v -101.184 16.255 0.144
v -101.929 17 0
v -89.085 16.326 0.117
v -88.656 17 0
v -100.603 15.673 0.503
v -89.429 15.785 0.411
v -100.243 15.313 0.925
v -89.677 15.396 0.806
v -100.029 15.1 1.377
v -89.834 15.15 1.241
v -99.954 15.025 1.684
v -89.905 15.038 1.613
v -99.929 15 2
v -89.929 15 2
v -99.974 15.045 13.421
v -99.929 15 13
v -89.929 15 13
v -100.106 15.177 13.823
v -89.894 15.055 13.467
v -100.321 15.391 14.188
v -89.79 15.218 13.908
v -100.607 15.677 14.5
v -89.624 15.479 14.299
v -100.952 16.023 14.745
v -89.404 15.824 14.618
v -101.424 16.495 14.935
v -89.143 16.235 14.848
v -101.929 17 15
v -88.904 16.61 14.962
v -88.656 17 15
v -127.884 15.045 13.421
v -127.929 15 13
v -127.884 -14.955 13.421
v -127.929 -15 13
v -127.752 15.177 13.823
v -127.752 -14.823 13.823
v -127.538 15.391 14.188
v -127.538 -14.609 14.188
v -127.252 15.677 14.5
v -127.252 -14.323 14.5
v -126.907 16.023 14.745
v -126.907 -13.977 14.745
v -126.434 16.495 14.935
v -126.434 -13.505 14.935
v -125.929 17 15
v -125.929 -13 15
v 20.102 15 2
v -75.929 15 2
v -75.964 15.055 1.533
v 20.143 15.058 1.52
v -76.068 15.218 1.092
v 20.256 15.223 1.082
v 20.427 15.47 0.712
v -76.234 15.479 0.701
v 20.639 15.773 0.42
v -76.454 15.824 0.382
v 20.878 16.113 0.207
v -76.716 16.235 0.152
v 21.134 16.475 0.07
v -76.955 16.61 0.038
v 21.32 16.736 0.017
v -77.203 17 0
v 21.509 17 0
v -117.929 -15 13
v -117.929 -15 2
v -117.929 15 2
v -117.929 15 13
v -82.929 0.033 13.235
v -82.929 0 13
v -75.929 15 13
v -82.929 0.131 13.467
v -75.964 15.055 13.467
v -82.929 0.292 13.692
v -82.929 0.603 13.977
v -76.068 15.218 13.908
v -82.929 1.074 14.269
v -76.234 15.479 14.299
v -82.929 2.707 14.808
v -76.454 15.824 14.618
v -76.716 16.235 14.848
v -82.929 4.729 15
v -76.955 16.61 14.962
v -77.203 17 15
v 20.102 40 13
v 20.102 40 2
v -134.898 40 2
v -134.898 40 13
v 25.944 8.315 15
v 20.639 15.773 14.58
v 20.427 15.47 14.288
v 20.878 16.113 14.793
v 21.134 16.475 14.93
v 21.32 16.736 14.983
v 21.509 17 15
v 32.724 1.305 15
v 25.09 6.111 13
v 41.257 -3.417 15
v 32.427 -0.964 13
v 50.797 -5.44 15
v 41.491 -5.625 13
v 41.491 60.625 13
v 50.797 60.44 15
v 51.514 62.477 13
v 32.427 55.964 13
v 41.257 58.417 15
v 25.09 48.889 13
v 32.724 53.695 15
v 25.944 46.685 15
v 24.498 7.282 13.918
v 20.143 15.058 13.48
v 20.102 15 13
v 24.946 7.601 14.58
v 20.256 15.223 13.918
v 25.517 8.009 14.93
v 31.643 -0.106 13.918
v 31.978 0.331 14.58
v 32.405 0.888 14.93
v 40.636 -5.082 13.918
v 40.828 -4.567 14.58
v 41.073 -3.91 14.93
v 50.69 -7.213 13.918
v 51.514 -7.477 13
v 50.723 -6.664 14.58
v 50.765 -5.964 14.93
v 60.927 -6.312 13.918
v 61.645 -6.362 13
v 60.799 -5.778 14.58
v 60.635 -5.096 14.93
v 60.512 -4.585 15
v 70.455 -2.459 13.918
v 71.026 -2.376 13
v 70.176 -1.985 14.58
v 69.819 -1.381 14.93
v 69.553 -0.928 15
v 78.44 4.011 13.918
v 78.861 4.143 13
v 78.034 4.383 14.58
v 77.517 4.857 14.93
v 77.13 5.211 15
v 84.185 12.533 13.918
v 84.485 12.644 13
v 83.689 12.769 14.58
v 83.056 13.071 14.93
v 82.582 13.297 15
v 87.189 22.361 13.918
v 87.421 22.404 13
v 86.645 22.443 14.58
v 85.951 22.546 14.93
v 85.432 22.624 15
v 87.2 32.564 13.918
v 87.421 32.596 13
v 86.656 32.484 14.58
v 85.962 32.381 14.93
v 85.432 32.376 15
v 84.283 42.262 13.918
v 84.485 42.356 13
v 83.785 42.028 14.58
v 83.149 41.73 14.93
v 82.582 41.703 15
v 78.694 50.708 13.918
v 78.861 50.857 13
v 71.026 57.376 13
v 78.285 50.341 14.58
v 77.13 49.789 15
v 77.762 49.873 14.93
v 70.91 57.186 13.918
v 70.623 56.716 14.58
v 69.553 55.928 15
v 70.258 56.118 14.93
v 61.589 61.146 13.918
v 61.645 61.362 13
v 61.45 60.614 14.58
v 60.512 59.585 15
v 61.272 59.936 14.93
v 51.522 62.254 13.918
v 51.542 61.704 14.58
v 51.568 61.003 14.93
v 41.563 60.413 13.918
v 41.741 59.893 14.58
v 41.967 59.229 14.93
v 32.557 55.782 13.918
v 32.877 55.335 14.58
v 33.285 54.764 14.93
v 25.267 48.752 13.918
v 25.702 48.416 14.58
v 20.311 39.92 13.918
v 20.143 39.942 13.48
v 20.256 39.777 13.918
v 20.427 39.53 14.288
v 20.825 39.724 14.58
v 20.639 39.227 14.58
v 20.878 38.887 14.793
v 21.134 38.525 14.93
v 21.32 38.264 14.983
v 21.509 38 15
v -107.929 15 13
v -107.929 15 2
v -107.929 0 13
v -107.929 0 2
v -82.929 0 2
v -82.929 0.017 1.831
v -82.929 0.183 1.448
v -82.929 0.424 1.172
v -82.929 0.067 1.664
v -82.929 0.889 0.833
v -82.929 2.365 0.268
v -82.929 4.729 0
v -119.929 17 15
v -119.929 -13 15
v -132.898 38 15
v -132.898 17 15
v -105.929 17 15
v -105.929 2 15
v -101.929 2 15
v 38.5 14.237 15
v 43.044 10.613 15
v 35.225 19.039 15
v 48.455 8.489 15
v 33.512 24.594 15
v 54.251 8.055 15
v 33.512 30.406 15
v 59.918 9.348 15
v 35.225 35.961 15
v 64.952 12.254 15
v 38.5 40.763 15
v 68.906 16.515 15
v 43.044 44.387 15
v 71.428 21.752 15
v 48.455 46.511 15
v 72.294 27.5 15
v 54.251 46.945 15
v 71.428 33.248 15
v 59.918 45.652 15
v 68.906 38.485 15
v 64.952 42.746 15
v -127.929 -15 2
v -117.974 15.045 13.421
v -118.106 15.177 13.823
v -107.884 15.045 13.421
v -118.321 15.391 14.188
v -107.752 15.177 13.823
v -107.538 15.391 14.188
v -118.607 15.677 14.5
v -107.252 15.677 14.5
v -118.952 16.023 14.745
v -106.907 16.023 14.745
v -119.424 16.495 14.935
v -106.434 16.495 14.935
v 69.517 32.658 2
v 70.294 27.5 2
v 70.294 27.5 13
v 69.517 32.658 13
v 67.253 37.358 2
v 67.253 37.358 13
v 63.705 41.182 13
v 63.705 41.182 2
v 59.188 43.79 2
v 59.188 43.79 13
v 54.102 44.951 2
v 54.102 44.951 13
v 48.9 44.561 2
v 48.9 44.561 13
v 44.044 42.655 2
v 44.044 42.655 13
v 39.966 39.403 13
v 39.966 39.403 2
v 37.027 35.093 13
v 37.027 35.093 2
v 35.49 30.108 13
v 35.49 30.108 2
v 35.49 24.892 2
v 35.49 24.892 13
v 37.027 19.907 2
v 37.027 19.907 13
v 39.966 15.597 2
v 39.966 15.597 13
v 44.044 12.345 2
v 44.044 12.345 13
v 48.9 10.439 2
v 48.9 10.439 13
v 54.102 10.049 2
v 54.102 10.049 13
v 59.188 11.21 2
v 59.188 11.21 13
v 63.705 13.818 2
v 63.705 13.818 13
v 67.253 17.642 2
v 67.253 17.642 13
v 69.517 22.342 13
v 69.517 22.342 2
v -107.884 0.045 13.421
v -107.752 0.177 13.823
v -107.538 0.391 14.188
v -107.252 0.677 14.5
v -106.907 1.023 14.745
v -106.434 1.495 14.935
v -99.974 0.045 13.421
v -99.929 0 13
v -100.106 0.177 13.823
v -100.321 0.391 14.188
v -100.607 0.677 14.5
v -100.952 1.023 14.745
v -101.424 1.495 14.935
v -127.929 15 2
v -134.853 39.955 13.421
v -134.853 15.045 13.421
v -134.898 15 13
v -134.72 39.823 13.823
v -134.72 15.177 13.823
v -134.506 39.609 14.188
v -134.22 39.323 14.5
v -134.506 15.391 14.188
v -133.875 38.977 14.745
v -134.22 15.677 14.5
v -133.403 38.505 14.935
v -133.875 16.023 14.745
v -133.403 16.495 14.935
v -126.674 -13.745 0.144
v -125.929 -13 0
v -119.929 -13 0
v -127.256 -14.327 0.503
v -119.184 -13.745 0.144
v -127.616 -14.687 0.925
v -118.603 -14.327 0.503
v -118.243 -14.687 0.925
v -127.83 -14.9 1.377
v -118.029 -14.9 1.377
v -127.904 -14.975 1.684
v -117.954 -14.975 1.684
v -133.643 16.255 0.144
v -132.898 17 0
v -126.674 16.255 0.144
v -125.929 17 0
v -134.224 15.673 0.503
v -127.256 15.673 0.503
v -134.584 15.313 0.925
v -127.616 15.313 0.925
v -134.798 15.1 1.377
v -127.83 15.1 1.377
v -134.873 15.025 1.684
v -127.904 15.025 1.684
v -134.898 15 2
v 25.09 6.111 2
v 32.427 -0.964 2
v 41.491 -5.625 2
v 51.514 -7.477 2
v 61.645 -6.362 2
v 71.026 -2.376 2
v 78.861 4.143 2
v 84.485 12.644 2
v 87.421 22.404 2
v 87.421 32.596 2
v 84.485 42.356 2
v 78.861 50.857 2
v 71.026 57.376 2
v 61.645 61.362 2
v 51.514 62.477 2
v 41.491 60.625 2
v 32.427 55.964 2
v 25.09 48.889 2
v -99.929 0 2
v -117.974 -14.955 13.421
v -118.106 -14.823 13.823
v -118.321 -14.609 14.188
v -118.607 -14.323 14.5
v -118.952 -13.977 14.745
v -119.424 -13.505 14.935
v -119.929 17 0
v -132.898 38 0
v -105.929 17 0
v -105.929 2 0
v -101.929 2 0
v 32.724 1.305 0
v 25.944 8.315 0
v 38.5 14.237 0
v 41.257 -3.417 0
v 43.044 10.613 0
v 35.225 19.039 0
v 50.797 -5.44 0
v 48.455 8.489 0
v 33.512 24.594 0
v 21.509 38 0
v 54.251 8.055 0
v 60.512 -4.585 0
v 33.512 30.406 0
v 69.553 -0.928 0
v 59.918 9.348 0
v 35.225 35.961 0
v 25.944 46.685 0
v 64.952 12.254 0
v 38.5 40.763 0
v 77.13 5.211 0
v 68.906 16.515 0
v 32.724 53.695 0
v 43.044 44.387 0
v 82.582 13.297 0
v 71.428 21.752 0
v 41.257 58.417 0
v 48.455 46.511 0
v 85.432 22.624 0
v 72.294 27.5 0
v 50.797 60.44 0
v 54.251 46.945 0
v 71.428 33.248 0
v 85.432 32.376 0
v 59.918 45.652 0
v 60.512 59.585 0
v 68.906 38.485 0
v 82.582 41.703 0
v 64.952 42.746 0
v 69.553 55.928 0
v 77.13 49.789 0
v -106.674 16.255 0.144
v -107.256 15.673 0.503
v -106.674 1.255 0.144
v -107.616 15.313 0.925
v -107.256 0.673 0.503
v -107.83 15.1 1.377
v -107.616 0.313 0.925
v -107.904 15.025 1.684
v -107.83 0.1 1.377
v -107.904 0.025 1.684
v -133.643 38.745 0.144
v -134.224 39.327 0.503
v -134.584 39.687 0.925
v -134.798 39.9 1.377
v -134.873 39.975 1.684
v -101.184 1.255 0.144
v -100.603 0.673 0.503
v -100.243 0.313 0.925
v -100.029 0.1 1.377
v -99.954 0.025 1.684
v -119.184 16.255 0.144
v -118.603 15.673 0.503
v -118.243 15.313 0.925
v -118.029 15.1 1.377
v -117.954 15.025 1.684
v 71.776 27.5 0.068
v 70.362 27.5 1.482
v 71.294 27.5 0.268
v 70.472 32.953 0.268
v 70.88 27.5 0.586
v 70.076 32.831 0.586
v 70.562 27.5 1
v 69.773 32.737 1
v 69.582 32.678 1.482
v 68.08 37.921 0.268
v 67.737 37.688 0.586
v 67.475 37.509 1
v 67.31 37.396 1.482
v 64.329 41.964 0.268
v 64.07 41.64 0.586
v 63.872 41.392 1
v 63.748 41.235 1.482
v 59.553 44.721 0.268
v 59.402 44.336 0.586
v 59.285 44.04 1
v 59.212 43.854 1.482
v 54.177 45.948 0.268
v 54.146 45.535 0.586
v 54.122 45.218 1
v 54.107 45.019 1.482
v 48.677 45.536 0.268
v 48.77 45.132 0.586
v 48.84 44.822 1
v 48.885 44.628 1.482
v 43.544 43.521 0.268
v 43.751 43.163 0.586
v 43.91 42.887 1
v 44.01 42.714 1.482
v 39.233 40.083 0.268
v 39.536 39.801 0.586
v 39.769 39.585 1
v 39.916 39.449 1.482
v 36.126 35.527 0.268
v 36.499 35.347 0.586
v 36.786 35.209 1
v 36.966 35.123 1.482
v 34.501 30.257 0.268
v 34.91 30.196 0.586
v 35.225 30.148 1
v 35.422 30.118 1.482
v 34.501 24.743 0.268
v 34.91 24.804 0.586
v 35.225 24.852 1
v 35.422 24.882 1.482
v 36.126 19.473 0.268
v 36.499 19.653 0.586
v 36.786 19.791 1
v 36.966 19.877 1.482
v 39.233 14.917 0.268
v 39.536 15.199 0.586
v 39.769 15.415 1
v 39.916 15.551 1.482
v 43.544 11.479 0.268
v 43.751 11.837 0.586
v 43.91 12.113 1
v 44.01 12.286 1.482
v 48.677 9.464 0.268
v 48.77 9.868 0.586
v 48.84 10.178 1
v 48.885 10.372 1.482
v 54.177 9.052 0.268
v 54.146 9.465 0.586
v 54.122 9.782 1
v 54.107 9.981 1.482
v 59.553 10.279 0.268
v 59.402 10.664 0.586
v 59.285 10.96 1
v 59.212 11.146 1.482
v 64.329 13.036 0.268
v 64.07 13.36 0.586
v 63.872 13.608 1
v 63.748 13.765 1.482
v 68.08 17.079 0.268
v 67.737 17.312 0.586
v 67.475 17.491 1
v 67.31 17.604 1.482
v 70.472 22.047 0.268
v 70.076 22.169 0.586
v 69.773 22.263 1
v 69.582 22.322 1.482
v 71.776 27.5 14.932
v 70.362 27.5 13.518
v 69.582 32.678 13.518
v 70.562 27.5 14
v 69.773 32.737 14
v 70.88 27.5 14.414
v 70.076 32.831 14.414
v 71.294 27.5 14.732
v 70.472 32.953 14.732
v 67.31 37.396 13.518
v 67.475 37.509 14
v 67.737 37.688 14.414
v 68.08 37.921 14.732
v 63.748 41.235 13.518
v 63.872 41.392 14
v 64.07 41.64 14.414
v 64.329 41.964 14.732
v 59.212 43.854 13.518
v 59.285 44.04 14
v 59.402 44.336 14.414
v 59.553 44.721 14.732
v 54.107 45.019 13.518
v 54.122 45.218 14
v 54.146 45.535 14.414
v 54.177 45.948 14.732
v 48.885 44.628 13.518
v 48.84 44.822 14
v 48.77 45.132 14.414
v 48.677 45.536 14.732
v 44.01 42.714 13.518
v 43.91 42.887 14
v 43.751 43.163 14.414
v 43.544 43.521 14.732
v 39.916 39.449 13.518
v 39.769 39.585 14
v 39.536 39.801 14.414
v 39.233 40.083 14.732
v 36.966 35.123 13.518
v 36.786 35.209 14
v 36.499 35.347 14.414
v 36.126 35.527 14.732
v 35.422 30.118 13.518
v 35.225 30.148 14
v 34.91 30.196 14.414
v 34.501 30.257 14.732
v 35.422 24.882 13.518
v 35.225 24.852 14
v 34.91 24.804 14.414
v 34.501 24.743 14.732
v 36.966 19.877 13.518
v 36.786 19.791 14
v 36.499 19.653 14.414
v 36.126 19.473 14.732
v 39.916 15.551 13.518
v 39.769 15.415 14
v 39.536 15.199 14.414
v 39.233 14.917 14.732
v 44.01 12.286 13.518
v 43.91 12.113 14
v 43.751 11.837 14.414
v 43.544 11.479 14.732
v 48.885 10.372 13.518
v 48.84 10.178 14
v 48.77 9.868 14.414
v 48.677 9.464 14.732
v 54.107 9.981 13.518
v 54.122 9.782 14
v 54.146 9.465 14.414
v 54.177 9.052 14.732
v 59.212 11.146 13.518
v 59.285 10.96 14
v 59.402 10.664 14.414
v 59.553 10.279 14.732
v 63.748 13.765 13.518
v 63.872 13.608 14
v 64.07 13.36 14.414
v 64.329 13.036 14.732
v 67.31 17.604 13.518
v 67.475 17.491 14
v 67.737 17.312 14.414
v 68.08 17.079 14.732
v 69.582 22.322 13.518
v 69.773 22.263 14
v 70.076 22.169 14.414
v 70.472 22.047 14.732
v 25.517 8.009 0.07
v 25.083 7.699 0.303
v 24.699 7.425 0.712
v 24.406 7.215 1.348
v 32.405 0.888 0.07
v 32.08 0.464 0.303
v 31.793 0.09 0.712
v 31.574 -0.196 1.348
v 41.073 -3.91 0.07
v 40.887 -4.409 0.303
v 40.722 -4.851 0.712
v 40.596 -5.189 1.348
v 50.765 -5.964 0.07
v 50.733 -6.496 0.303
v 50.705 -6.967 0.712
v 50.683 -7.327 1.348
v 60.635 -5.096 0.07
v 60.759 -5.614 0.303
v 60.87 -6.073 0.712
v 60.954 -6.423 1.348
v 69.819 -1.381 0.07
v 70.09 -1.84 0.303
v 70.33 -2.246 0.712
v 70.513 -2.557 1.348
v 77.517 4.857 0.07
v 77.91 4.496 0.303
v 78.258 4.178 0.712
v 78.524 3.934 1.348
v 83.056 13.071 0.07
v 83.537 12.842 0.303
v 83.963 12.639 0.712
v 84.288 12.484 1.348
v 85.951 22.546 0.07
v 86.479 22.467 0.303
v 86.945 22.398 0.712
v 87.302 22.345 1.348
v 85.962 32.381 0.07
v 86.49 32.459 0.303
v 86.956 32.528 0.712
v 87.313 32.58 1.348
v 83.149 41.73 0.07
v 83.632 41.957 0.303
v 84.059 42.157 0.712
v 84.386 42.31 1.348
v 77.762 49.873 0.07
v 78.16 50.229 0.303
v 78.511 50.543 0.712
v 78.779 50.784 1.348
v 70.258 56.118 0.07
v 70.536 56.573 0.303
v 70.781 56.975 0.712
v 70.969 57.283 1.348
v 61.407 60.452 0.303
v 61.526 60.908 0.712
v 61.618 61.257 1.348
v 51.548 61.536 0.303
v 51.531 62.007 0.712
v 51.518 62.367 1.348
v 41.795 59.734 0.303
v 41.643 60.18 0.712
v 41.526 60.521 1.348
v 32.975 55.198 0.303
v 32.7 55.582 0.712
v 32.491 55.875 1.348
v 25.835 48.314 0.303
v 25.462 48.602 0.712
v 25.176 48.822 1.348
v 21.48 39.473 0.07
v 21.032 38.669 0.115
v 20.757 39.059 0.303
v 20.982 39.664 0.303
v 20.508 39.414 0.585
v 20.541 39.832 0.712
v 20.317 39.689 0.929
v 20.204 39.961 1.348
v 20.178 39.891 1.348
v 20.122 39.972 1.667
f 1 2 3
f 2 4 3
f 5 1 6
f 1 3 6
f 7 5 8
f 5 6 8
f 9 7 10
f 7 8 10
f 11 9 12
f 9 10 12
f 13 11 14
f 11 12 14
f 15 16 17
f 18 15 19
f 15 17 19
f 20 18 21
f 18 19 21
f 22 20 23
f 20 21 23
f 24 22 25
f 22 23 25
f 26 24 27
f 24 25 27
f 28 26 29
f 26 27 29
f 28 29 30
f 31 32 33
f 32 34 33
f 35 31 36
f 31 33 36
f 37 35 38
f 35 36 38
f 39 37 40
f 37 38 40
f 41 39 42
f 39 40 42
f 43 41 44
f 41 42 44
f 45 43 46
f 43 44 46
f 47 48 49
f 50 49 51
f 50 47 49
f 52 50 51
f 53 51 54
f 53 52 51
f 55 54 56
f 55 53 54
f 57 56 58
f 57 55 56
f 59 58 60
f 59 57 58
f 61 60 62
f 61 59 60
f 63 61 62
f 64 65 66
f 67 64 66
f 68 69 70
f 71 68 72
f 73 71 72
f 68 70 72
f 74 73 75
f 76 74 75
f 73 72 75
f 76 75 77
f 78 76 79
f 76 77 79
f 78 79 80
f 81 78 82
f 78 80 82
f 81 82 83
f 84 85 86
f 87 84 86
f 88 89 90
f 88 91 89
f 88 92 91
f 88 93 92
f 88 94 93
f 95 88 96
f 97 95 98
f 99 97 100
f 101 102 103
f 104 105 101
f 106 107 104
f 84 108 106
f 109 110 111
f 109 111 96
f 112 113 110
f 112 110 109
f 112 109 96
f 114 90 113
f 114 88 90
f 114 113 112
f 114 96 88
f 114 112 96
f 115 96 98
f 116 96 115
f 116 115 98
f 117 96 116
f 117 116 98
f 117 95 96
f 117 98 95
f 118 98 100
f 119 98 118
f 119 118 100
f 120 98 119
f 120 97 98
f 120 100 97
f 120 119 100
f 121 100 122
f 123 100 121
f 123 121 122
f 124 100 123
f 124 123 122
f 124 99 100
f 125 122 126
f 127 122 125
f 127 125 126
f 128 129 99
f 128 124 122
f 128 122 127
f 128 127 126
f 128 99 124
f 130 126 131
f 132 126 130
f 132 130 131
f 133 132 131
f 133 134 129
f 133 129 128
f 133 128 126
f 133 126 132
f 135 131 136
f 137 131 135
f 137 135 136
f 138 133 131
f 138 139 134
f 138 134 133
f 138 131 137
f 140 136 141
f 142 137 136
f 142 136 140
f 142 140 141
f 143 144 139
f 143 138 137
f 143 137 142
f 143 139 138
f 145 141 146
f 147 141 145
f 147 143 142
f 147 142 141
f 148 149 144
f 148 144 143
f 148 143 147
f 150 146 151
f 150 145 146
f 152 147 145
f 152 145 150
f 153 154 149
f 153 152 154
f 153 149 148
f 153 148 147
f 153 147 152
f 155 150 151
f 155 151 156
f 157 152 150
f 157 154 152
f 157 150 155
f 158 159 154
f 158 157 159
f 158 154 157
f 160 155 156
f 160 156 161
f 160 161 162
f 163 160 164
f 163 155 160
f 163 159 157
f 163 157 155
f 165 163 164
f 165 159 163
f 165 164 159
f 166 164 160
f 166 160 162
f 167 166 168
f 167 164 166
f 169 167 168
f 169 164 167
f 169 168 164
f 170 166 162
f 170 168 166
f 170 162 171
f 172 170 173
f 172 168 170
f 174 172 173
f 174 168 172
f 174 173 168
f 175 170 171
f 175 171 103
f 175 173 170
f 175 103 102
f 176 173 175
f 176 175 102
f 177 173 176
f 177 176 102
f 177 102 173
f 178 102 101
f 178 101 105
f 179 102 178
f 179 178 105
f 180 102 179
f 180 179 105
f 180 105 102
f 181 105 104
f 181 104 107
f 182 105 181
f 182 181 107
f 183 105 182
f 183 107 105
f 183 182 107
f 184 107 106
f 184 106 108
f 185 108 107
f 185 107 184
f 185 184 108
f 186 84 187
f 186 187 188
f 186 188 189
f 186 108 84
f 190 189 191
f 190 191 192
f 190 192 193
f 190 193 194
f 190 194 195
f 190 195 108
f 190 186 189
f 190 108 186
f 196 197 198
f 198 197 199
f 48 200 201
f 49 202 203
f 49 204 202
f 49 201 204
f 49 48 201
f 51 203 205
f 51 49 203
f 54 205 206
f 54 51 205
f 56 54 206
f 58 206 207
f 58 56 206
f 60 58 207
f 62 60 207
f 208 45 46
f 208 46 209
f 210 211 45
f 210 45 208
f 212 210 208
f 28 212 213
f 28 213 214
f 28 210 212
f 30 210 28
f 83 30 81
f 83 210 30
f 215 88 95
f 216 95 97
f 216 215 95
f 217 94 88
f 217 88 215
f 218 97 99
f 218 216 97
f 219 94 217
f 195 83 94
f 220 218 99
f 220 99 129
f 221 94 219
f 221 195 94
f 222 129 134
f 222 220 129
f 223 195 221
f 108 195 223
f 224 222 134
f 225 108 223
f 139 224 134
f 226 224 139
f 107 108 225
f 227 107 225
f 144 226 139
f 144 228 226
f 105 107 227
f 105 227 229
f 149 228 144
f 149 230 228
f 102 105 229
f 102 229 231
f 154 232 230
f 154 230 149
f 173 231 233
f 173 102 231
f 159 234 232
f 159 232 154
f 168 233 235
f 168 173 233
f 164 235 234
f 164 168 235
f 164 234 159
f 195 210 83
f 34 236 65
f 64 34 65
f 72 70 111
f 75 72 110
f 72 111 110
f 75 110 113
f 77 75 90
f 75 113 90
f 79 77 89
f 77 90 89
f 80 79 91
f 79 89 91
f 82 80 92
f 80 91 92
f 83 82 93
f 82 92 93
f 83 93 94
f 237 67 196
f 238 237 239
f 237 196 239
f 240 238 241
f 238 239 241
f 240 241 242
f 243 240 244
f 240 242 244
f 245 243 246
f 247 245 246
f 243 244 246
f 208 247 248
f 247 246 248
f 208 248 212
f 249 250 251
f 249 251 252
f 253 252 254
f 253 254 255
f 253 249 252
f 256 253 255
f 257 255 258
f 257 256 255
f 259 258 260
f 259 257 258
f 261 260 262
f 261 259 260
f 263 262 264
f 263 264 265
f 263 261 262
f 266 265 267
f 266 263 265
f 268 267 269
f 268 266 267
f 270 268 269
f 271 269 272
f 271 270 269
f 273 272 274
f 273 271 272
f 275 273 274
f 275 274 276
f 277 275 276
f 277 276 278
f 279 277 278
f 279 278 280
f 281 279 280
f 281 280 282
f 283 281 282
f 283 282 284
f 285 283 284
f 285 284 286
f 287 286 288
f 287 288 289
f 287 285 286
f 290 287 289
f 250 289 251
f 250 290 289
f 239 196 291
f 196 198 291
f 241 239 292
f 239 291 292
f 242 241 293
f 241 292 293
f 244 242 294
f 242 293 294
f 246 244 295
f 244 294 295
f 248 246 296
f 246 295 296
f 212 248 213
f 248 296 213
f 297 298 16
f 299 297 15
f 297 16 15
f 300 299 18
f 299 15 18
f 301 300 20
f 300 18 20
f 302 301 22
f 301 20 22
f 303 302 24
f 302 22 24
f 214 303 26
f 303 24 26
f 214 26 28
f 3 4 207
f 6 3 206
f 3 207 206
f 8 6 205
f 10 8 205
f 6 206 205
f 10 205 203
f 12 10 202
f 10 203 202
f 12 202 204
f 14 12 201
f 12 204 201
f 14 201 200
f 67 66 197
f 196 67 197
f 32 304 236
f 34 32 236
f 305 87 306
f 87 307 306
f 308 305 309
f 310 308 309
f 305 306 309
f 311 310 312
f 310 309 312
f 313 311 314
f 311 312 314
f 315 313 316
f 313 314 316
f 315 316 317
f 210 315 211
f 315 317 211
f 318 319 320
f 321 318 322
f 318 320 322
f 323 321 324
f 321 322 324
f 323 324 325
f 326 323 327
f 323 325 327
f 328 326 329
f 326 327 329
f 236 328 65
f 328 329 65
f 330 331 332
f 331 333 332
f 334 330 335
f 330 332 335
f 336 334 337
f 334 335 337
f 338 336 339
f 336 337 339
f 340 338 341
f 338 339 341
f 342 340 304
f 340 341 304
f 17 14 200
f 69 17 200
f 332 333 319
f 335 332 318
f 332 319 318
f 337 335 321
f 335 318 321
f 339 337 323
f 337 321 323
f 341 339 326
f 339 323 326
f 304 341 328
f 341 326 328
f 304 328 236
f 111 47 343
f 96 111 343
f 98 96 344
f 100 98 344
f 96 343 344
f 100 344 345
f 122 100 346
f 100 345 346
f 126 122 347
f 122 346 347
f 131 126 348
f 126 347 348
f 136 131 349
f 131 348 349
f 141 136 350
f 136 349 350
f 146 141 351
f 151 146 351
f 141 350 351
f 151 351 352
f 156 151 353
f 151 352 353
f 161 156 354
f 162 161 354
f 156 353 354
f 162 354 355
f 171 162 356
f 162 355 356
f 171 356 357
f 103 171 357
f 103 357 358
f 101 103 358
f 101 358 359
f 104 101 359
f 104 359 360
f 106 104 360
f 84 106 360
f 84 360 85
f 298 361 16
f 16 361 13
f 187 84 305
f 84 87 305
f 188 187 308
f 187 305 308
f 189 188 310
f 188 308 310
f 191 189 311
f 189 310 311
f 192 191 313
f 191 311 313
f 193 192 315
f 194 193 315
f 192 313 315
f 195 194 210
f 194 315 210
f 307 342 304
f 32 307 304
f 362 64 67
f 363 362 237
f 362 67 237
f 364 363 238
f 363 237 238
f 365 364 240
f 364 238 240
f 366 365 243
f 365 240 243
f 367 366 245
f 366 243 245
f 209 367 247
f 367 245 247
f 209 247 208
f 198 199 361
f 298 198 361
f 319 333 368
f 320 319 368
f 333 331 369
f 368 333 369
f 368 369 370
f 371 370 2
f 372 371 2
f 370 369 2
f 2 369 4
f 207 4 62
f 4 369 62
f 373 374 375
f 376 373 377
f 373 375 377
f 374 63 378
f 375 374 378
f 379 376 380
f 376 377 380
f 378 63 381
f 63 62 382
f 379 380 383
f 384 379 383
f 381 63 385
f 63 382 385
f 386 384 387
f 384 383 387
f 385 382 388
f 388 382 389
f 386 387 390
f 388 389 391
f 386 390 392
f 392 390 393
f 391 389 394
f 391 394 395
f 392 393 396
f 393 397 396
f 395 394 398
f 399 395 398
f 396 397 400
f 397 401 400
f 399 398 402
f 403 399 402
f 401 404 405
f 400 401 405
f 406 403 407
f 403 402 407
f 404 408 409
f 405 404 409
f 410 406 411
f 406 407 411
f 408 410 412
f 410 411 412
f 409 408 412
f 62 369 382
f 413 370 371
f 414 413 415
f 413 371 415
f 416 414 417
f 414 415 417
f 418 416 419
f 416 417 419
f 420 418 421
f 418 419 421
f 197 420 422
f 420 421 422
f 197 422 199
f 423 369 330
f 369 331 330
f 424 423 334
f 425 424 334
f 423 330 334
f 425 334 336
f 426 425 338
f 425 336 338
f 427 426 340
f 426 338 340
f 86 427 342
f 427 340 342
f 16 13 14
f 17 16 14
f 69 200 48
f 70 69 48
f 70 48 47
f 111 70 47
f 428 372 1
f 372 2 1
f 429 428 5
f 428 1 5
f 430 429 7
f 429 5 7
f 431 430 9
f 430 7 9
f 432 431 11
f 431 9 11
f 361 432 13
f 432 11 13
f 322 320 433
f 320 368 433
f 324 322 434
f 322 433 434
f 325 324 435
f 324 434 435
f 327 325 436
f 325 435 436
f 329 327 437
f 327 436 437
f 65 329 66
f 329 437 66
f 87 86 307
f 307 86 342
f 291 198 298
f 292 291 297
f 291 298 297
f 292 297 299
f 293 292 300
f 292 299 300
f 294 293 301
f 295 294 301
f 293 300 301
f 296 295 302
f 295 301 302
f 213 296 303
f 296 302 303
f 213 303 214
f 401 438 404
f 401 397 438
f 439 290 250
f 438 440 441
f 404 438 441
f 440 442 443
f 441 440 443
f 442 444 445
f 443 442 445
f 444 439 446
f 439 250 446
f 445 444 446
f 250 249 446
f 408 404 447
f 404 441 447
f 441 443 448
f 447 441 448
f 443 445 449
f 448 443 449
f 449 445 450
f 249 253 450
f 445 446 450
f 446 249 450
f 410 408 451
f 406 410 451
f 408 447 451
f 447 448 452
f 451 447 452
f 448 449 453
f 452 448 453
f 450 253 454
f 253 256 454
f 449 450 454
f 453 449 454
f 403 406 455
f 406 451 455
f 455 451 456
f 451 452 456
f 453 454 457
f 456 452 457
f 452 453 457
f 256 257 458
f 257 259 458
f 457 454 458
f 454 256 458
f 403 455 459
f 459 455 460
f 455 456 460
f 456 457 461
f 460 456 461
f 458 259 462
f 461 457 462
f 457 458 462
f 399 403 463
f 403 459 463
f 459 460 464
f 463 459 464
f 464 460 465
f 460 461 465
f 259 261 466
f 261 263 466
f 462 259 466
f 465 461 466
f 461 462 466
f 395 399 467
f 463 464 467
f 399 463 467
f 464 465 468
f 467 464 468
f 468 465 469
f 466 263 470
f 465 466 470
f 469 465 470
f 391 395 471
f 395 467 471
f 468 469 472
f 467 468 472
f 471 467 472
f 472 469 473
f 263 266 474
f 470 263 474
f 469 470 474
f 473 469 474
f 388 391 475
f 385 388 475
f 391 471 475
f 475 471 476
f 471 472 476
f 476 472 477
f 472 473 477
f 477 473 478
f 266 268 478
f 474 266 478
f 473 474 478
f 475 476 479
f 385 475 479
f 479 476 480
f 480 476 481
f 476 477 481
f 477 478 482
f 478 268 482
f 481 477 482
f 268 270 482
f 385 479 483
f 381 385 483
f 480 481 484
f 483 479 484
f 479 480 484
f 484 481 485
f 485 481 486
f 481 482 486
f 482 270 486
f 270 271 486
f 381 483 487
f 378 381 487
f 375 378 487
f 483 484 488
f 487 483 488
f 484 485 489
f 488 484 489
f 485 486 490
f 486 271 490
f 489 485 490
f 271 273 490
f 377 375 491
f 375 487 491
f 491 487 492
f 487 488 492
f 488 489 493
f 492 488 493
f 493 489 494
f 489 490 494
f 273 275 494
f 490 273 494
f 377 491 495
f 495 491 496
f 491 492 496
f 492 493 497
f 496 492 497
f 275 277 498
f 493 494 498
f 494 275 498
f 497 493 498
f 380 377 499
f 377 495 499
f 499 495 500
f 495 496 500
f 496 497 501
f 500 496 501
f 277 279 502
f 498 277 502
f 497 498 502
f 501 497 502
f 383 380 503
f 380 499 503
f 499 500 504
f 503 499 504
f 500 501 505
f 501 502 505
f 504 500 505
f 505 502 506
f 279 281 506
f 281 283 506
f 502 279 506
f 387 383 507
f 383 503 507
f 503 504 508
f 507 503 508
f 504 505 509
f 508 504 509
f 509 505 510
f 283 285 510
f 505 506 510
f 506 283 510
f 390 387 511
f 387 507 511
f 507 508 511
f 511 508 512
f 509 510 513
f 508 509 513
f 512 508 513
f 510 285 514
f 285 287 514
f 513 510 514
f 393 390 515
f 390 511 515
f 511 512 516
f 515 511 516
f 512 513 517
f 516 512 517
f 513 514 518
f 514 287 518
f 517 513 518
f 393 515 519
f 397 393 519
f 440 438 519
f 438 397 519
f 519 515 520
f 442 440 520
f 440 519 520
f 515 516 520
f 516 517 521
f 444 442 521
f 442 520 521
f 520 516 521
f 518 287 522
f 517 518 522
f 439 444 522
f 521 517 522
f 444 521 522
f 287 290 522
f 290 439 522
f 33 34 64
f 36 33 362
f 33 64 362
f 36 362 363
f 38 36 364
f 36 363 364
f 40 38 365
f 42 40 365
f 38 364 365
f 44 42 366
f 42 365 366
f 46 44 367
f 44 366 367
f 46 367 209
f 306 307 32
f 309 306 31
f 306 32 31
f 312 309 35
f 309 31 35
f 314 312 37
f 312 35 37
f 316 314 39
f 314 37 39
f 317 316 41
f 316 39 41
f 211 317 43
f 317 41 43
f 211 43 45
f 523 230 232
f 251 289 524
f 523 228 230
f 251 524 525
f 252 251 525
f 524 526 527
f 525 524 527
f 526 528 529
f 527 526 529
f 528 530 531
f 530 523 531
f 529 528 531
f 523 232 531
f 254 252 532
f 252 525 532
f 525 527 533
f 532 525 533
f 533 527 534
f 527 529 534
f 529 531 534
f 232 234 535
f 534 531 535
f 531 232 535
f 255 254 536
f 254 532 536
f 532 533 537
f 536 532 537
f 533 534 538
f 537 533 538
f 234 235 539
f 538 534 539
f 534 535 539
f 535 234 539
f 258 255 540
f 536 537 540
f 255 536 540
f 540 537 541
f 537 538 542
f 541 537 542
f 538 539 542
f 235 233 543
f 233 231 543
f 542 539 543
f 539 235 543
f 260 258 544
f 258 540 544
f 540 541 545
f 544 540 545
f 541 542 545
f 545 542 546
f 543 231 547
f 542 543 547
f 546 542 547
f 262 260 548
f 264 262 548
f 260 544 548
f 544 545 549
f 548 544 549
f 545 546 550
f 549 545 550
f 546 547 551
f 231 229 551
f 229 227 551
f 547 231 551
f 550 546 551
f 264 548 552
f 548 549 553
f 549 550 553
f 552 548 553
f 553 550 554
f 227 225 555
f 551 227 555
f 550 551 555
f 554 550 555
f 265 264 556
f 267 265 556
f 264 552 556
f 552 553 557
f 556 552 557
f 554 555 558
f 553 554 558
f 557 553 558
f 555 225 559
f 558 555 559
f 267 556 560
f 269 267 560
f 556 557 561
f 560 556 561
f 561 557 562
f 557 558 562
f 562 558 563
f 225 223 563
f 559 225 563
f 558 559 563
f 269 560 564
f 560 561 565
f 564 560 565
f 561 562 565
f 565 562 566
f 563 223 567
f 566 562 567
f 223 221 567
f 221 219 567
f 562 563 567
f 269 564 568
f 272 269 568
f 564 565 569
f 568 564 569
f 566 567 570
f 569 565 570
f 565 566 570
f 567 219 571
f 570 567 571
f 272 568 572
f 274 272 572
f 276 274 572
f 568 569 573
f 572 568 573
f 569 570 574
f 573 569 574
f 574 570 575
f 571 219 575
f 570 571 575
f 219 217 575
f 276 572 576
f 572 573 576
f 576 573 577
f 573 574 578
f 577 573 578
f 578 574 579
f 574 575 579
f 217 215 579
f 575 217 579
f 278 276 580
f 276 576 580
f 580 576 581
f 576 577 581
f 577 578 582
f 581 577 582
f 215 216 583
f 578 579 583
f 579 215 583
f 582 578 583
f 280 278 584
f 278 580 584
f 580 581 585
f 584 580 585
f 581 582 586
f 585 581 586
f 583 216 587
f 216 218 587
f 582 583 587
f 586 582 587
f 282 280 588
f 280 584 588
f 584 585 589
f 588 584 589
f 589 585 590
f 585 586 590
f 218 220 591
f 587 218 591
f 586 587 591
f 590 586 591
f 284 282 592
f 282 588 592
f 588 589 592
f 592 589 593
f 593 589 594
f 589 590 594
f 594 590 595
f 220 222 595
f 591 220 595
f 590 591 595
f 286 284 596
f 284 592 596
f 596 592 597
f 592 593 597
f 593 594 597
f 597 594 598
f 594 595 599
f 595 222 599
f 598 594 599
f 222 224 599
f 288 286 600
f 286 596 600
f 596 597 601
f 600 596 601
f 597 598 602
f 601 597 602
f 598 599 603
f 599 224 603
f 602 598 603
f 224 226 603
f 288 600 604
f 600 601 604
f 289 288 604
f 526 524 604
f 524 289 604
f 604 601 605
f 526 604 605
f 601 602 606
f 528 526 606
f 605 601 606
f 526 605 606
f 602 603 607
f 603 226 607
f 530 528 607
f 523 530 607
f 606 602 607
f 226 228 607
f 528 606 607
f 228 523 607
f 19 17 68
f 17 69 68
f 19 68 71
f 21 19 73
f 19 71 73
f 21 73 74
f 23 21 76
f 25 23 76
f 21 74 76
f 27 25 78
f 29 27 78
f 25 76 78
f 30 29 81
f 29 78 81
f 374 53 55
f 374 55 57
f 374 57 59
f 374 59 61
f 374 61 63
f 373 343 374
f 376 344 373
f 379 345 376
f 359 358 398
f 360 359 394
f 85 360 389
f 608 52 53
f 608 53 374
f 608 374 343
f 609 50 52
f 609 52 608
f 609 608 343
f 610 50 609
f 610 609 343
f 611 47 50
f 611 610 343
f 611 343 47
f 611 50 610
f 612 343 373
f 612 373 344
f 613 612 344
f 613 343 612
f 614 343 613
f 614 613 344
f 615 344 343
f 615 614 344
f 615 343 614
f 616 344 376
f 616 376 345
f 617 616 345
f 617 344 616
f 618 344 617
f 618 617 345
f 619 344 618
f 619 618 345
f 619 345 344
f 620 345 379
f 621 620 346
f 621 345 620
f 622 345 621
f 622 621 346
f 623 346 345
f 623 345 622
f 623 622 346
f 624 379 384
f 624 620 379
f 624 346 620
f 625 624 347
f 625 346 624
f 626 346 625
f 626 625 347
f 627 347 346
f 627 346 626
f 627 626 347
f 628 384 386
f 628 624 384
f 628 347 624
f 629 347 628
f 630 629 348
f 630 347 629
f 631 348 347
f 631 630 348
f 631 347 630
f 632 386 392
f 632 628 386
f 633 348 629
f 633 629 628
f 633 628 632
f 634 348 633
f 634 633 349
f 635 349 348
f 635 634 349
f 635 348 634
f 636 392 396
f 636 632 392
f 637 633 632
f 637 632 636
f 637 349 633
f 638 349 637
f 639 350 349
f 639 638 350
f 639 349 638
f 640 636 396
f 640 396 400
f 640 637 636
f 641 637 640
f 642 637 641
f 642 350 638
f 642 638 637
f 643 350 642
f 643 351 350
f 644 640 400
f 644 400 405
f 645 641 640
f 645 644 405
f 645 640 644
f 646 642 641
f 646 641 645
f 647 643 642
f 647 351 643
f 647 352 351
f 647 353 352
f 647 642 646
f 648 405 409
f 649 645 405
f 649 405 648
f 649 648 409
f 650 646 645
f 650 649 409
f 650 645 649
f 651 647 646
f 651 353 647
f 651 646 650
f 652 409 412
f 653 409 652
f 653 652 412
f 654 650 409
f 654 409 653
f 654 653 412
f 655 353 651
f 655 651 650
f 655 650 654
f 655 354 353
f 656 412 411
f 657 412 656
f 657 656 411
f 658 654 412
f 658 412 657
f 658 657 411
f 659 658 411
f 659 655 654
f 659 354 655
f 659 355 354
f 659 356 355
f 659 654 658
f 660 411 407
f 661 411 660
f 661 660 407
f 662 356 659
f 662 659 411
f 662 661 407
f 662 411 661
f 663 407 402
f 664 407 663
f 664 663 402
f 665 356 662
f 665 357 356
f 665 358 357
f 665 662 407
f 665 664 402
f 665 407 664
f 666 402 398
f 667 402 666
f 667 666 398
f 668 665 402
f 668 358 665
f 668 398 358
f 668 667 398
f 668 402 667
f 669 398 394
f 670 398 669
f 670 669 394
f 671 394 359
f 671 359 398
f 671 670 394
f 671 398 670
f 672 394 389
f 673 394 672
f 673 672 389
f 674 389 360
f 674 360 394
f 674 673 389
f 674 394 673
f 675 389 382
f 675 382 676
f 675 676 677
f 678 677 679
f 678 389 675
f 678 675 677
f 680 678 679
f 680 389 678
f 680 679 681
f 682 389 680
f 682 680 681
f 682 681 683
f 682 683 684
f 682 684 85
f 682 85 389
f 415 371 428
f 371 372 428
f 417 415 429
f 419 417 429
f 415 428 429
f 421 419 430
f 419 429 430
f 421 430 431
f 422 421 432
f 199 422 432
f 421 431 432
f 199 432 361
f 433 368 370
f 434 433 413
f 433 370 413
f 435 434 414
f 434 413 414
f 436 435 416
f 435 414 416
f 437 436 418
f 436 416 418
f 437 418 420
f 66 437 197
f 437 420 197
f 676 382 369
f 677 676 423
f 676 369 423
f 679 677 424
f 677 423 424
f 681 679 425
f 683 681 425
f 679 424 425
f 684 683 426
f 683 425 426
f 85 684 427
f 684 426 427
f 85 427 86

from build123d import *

# Parameters (mm, degrees)
F0_R     = 17.5
F1_DEPTH = 15
F2_R     = 2
F3_R     = 2


with BuildPart() as f1:
    # F0 (on Top) → F1 (new body)
    with BuildSketch(Plane.XY):
        with BuildLine():
            Line((-75.929283, 15), (20.102384, 15))
            ThreePointArc((20.102384, 15), (87.794126, 27.5), (20.102384, 40))
            Line((20.102384, 40), (-134.897616, 40))
            Line((-134.897616, 40), (-134.897616, 15))
            Line((-134.897616, 15), (-127.929283, 15))
            Line((-127.929283, 15), (-127.929283, -15))
            Line((-127.929283, -15), (-117.929283, -15))
            Line((-117.929283, -15), (-117.929283, 15))
            Line((-117.929283, 15), (-107.929283, 15))
            Line((-107.929283, 15), (-107.929283, 0))
            Line((-107.929283, 0), (-99.929283, 0))
            Line((-99.929283, 0), (-99.929283, 15))
            Line((-99.929283, 15), (-89.929283, 15))
            Line((-89.929283, 15), (-82.929283, 0))
            Line((-82.929283, 0), (-75.929283, 15))
        make_face()
        with Locations((52.794126, 27.5)):
            Circle(F0_R, mode=Mode.SUBTRACT)
    extrude(amount=F1_DEPTH)

    # F2
    f2_edges = [f1.edges().sort_by_distance(p)[0] for p in [
        (-27.913449, 15, 15),
        (87.794126, 27.5, 15),
        (-57.397616, 40, 15),
        (-134.897616, 27.5, 15),
        (-131.413449, 15, 15),
        (-127.929283, 0, 15),
        (-122.929283, -15, 15),
        (-117.929283, 0, 15),
        (-112.929283, 15, 15),
        (-107.929283, 7.5, 15),
        (-103.929283, 0, 15),
        (-99.929283, 7.5, 15),
        (-94.929283, 15, 15),
        (-86.429283, 7.5, 15),
        (-79.429283, 7.5, 15),
        (35.294126, 27.5, 15),
    ]]
    fillet(f2_edges, radius=F2_R)

    # F3
    f3_edges = [f1.edges().sort_by_distance(p)[0] for p in [
        (-27.913449, 15, 0),
        (87.794126, 27.5, 0),
        (-57.397616, 40, 0),
        (-134.897616, 27.5, 0),
        (-131.413449, 15, 0),
        (-127.929283, 0, 0),
        (-122.929283, -15, 0),
        (-117.929283, 0, 0),
        (-112.929283, 15, 0),
        (-107.929283, 7.5, 0),
        (-103.929283, 0, 0),
        (-99.929283, 7.5, 0),
        (-94.929283, 15, 0),
        (-86.429283, 7.5, 0),
        (-79.429283, 7.5, 0),
        (35.294126, 27.5, 0),
    ]]
    fillet(f3_edges, radius=F3_R)


solid = f1.part
